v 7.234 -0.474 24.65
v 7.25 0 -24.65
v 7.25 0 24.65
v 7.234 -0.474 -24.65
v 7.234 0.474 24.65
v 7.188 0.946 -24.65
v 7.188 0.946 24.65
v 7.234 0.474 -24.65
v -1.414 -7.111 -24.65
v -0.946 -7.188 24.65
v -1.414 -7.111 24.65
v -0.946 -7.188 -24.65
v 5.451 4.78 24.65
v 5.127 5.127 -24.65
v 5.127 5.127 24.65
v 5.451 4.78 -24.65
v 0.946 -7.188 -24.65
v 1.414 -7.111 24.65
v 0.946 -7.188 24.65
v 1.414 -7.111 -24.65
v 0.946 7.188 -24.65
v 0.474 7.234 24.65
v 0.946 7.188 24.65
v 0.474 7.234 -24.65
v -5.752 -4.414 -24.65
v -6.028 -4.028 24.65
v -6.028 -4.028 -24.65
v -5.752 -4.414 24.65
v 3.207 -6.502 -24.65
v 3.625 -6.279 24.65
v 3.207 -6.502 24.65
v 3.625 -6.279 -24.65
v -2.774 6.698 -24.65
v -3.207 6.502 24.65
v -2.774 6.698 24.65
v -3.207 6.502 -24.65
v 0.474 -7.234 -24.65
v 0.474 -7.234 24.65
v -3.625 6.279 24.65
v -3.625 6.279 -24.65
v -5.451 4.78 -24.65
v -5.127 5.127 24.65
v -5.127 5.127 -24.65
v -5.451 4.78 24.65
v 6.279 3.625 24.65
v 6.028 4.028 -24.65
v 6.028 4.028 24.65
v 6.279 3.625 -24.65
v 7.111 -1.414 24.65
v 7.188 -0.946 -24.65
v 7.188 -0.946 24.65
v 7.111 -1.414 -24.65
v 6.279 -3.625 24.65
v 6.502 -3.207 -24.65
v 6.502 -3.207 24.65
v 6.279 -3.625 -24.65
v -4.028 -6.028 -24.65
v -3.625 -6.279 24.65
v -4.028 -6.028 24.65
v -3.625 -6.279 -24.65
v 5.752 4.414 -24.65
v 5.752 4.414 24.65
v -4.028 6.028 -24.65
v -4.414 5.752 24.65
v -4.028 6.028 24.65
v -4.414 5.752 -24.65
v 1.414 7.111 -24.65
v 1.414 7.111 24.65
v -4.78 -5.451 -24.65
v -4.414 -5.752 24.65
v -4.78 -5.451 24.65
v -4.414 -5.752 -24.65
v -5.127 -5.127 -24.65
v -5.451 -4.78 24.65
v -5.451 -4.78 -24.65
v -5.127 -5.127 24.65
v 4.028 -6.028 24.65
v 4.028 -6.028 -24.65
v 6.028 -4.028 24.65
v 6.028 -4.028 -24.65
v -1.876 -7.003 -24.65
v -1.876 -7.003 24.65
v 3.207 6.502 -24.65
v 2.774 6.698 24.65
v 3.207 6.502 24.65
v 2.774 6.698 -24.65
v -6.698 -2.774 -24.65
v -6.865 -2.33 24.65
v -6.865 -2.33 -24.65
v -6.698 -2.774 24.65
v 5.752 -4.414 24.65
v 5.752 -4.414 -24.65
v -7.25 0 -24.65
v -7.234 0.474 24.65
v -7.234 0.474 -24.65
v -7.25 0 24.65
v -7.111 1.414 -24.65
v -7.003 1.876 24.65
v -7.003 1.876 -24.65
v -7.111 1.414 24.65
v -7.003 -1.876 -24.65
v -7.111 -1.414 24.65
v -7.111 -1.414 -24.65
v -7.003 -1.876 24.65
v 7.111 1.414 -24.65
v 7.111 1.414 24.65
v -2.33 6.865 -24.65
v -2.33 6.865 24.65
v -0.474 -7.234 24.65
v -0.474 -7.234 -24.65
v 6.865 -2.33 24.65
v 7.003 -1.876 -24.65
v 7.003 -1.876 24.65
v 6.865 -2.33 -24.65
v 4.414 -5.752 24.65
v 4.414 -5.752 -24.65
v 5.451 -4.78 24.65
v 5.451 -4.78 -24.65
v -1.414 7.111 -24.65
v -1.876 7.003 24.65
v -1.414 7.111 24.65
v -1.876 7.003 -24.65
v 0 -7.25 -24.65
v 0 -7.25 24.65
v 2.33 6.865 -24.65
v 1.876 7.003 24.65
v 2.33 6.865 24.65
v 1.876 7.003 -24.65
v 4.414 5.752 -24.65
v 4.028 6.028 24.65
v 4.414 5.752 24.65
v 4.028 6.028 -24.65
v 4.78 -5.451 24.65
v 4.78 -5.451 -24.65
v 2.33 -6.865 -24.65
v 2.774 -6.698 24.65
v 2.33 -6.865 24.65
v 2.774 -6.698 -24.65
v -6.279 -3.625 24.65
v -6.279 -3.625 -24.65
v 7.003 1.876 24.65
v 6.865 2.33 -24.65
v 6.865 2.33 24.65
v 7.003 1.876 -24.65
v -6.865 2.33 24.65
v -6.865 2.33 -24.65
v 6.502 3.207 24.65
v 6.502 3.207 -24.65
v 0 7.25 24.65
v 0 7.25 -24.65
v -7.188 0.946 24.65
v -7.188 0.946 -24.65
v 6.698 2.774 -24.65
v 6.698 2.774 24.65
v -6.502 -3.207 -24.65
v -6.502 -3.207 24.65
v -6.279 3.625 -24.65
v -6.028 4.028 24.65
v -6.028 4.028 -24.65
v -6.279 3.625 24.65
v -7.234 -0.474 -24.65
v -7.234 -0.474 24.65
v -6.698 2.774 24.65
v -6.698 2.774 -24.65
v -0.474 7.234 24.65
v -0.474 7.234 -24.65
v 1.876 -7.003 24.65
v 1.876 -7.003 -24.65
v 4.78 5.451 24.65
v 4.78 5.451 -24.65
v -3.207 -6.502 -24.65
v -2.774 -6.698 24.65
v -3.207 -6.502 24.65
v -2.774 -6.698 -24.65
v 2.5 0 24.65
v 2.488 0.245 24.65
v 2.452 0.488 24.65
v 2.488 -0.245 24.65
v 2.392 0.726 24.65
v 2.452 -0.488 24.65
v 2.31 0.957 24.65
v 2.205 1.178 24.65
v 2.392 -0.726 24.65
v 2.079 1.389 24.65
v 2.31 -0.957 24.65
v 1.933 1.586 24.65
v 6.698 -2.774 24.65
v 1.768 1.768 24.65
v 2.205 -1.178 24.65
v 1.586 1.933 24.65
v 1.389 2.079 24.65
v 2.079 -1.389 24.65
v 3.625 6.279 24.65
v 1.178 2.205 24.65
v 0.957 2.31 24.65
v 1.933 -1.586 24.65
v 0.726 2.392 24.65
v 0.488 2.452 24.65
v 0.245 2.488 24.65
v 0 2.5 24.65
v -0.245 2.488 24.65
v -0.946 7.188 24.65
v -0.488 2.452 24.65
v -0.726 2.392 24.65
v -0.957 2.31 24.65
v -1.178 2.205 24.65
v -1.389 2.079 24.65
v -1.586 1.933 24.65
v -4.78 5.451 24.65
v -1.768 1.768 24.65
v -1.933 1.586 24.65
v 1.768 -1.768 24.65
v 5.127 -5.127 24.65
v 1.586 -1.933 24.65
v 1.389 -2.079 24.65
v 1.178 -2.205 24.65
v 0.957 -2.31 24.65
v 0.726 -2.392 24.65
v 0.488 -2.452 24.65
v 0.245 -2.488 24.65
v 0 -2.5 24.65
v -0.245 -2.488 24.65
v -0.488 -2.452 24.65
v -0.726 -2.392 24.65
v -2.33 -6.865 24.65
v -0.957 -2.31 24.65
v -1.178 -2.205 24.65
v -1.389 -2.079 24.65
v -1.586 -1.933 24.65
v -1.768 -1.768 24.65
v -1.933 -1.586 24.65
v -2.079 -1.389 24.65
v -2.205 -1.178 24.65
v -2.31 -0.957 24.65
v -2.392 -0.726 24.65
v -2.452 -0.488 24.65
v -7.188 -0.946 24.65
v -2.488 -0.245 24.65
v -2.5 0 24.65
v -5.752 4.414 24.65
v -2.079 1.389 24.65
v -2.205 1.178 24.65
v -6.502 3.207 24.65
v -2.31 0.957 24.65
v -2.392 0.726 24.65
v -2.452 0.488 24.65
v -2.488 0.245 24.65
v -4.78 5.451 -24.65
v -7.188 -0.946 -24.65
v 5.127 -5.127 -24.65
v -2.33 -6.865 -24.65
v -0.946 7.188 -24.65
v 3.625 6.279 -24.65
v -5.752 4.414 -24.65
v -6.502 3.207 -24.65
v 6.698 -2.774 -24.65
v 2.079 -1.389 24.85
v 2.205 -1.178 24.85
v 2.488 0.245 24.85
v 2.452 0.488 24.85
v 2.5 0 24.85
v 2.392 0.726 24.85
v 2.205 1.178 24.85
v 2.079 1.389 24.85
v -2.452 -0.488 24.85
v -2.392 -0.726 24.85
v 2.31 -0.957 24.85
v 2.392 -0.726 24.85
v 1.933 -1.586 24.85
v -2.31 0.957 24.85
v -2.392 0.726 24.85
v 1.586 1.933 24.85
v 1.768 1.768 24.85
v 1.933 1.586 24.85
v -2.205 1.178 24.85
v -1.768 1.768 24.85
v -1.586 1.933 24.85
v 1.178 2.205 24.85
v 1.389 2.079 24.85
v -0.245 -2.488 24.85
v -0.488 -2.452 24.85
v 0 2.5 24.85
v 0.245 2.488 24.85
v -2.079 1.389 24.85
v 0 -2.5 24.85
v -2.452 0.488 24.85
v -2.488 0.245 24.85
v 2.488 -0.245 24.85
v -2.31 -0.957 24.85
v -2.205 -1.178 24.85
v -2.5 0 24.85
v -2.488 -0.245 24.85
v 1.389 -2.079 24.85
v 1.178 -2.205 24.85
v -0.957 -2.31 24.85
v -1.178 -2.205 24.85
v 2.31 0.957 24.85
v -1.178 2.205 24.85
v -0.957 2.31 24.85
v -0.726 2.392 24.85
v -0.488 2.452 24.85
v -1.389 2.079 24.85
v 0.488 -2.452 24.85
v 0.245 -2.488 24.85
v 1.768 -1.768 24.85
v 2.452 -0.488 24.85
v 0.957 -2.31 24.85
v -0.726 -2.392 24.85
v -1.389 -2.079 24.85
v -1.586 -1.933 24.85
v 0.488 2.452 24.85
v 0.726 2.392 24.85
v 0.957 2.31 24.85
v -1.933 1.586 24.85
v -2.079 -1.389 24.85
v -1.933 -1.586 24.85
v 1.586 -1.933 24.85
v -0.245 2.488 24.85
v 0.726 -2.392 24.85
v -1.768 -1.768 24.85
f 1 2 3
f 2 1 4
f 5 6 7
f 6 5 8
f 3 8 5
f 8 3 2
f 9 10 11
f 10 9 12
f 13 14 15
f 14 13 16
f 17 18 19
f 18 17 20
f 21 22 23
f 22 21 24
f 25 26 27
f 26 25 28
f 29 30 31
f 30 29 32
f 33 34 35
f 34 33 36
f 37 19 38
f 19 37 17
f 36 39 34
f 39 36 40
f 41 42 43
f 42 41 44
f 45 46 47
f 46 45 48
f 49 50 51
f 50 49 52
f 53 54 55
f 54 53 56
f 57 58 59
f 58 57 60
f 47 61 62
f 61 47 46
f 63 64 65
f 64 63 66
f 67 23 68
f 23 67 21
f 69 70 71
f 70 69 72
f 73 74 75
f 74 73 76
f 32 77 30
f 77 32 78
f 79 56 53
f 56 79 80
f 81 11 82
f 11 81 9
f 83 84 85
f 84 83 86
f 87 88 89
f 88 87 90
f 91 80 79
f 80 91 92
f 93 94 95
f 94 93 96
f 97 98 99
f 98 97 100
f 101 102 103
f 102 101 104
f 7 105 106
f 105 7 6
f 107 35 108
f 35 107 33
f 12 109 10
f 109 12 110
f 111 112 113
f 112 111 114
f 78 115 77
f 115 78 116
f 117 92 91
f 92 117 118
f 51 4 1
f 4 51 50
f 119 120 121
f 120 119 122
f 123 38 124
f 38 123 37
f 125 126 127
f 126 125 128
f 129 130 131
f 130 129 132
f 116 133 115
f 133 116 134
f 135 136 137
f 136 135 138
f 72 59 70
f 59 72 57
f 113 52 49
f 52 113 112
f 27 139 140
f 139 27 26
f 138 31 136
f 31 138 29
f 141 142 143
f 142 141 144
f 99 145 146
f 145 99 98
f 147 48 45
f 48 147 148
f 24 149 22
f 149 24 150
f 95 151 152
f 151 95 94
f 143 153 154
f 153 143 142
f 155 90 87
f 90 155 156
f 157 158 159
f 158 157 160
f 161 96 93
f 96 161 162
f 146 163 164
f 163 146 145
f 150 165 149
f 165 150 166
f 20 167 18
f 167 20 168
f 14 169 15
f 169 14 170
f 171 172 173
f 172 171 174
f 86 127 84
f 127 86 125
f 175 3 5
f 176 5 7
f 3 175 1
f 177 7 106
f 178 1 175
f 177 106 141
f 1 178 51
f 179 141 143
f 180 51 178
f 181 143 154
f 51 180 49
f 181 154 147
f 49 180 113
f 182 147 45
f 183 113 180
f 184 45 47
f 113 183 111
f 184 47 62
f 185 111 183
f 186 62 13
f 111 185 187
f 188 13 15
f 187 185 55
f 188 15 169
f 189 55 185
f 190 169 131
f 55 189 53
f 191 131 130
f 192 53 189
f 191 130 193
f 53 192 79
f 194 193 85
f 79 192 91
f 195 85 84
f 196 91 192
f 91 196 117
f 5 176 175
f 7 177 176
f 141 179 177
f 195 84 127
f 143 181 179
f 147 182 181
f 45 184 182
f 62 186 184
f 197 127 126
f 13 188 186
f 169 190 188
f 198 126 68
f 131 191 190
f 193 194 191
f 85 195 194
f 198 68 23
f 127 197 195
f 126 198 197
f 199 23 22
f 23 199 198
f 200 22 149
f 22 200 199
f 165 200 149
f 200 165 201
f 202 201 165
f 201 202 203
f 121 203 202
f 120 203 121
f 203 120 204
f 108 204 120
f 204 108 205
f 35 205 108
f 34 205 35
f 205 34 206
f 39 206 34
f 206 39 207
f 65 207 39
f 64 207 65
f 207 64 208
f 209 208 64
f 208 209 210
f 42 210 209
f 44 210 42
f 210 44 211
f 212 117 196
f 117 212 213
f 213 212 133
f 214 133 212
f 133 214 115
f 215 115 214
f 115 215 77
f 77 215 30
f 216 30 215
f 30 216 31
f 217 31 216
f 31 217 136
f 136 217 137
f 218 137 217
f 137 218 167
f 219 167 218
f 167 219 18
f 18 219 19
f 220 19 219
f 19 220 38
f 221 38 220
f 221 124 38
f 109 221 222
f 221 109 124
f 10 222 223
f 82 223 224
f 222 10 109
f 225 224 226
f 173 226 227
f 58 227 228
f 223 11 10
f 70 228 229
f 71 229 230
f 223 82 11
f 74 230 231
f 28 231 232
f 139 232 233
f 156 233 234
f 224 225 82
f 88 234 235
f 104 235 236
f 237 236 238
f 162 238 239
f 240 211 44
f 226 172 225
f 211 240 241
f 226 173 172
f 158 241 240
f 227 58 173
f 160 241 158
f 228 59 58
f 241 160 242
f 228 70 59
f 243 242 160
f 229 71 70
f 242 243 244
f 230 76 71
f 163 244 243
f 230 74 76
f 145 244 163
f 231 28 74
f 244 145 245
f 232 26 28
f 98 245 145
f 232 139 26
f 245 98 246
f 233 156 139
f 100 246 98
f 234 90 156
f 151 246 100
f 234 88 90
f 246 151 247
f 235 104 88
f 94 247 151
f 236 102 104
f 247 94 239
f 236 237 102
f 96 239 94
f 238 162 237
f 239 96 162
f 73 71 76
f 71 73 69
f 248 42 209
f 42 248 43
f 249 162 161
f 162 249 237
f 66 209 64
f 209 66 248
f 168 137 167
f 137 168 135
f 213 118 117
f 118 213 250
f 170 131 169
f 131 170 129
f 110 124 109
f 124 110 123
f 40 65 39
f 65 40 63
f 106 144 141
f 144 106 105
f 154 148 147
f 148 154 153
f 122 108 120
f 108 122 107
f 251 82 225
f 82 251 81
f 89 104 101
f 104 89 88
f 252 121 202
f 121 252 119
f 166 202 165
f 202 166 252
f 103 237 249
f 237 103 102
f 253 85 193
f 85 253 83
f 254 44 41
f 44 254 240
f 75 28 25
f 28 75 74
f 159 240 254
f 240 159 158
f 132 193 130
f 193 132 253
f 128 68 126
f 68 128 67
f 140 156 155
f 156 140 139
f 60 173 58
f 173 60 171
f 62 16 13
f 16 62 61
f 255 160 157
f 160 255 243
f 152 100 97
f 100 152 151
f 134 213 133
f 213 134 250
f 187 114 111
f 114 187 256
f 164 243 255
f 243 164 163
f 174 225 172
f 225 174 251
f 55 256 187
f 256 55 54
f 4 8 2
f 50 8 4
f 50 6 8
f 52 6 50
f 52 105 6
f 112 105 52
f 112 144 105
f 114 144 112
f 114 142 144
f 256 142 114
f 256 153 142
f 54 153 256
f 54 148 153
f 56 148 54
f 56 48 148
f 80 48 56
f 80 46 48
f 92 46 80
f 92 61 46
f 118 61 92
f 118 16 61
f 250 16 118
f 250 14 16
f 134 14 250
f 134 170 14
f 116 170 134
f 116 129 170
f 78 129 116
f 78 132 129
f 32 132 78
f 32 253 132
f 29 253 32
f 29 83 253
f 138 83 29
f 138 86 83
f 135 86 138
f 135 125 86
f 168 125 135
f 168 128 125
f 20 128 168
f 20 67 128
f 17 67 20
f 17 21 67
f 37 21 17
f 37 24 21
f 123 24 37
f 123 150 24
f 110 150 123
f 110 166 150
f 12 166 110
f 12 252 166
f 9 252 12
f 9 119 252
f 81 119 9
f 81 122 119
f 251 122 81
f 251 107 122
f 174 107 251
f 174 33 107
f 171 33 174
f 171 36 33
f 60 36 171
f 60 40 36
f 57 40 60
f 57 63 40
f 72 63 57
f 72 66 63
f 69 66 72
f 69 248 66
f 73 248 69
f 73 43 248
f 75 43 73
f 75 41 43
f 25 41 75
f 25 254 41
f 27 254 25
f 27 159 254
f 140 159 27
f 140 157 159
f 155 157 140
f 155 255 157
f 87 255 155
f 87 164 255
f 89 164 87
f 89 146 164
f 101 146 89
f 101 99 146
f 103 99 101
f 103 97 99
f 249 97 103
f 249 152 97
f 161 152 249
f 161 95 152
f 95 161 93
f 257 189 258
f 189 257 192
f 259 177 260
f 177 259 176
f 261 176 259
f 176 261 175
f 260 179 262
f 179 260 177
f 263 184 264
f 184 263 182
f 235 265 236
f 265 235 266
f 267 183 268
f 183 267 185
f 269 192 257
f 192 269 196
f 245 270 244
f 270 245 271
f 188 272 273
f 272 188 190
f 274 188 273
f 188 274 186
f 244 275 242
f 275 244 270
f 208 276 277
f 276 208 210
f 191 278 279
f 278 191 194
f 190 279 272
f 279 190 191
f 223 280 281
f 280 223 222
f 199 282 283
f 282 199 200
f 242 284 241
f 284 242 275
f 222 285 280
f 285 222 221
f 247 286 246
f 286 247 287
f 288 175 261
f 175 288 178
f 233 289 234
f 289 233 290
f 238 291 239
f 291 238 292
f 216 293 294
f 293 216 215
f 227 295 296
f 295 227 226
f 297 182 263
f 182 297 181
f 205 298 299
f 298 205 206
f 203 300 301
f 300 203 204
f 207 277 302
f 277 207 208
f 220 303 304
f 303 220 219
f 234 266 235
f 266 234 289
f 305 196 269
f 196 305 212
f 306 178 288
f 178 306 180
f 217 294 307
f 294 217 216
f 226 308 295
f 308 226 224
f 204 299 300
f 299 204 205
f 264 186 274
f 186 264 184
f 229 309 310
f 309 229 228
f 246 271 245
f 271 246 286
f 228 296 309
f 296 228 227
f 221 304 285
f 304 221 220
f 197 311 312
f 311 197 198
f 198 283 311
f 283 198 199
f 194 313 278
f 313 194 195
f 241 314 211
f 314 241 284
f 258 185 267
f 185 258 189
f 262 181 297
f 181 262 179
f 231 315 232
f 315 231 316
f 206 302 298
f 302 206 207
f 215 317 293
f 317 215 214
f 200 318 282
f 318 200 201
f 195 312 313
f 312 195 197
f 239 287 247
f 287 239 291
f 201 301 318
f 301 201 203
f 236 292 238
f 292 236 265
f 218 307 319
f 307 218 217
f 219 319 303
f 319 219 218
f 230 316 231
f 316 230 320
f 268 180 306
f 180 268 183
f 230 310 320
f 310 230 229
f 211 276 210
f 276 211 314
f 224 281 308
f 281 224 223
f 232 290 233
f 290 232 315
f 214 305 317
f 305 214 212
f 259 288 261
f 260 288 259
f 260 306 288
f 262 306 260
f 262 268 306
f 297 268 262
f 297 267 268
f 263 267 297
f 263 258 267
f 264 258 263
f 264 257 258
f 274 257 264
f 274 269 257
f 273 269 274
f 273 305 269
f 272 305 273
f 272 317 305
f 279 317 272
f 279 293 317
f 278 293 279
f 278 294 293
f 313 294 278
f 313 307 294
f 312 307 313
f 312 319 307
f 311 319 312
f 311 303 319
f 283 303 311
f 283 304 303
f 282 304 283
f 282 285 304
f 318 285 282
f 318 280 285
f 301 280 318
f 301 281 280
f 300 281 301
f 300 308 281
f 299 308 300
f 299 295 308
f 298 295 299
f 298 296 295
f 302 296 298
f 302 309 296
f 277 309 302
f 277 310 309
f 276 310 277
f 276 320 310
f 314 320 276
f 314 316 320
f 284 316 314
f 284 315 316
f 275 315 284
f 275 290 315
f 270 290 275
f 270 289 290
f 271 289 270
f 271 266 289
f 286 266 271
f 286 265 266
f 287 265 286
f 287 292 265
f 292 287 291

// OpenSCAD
// Battery cell: 50.5mm tall, 14.5mm diameter (one connected solid)

// Parameters
overall_height_mm = 50.5;                 //[25.25:101:0.1]
outer_diameter_mm = 14.5;                 //[7.25:29:0.1]

positive_terminal_height_mm = 1;          //[0.5:2:0.05]
positive_terminal_diameter_mm = 5;        //[2.5:10:0.1]

negative_terminal_height_mm = 0.2;        //[0.1:0.6:0.05]
negative_terminal_diameter_mm = 10;       //[5:20:0.1]

terminal_overlap_mm = 0.8;                //[0.5:2:0.1]

// Derived: ensure total height matches overall_height_mm exactly
body_height_mm = overall_height_mm - positive_terminal_height_mm - negative_terminal_height_mm;

// AACELL - complete geometry (single connected solid)
module AACELL() {
    union() {
        // Main cylindrical body (centered)
        color("Silver")
            cylinder(r=outer_diameter_mm/2, h=body_height_mm, center=true, $fn=96);

        // Positive terminal button (connected with overlap)
        color("Gold")
            translate([0, 0, body_height_mm/2 + positive_terminal_height_mm/2 - terminal_overlap_mm])
                cylinder(r=positive_terminal_diameter_mm/2, h=positive_terminal_height_mm, center=true, $fn=64);

        // Negative terminal contact (connected with overlap)
        color("Copper")
            translate([0, 0, -body_height_mm/2 - negative_terminal_height_mm/2 + terminal_overlap_mm])
                cylinder(r=negative_terminal_diameter_mm/2, h=negative_terminal_height_mm, center=true, $fn=64);
    }
}

// Assembly
AACELL();
